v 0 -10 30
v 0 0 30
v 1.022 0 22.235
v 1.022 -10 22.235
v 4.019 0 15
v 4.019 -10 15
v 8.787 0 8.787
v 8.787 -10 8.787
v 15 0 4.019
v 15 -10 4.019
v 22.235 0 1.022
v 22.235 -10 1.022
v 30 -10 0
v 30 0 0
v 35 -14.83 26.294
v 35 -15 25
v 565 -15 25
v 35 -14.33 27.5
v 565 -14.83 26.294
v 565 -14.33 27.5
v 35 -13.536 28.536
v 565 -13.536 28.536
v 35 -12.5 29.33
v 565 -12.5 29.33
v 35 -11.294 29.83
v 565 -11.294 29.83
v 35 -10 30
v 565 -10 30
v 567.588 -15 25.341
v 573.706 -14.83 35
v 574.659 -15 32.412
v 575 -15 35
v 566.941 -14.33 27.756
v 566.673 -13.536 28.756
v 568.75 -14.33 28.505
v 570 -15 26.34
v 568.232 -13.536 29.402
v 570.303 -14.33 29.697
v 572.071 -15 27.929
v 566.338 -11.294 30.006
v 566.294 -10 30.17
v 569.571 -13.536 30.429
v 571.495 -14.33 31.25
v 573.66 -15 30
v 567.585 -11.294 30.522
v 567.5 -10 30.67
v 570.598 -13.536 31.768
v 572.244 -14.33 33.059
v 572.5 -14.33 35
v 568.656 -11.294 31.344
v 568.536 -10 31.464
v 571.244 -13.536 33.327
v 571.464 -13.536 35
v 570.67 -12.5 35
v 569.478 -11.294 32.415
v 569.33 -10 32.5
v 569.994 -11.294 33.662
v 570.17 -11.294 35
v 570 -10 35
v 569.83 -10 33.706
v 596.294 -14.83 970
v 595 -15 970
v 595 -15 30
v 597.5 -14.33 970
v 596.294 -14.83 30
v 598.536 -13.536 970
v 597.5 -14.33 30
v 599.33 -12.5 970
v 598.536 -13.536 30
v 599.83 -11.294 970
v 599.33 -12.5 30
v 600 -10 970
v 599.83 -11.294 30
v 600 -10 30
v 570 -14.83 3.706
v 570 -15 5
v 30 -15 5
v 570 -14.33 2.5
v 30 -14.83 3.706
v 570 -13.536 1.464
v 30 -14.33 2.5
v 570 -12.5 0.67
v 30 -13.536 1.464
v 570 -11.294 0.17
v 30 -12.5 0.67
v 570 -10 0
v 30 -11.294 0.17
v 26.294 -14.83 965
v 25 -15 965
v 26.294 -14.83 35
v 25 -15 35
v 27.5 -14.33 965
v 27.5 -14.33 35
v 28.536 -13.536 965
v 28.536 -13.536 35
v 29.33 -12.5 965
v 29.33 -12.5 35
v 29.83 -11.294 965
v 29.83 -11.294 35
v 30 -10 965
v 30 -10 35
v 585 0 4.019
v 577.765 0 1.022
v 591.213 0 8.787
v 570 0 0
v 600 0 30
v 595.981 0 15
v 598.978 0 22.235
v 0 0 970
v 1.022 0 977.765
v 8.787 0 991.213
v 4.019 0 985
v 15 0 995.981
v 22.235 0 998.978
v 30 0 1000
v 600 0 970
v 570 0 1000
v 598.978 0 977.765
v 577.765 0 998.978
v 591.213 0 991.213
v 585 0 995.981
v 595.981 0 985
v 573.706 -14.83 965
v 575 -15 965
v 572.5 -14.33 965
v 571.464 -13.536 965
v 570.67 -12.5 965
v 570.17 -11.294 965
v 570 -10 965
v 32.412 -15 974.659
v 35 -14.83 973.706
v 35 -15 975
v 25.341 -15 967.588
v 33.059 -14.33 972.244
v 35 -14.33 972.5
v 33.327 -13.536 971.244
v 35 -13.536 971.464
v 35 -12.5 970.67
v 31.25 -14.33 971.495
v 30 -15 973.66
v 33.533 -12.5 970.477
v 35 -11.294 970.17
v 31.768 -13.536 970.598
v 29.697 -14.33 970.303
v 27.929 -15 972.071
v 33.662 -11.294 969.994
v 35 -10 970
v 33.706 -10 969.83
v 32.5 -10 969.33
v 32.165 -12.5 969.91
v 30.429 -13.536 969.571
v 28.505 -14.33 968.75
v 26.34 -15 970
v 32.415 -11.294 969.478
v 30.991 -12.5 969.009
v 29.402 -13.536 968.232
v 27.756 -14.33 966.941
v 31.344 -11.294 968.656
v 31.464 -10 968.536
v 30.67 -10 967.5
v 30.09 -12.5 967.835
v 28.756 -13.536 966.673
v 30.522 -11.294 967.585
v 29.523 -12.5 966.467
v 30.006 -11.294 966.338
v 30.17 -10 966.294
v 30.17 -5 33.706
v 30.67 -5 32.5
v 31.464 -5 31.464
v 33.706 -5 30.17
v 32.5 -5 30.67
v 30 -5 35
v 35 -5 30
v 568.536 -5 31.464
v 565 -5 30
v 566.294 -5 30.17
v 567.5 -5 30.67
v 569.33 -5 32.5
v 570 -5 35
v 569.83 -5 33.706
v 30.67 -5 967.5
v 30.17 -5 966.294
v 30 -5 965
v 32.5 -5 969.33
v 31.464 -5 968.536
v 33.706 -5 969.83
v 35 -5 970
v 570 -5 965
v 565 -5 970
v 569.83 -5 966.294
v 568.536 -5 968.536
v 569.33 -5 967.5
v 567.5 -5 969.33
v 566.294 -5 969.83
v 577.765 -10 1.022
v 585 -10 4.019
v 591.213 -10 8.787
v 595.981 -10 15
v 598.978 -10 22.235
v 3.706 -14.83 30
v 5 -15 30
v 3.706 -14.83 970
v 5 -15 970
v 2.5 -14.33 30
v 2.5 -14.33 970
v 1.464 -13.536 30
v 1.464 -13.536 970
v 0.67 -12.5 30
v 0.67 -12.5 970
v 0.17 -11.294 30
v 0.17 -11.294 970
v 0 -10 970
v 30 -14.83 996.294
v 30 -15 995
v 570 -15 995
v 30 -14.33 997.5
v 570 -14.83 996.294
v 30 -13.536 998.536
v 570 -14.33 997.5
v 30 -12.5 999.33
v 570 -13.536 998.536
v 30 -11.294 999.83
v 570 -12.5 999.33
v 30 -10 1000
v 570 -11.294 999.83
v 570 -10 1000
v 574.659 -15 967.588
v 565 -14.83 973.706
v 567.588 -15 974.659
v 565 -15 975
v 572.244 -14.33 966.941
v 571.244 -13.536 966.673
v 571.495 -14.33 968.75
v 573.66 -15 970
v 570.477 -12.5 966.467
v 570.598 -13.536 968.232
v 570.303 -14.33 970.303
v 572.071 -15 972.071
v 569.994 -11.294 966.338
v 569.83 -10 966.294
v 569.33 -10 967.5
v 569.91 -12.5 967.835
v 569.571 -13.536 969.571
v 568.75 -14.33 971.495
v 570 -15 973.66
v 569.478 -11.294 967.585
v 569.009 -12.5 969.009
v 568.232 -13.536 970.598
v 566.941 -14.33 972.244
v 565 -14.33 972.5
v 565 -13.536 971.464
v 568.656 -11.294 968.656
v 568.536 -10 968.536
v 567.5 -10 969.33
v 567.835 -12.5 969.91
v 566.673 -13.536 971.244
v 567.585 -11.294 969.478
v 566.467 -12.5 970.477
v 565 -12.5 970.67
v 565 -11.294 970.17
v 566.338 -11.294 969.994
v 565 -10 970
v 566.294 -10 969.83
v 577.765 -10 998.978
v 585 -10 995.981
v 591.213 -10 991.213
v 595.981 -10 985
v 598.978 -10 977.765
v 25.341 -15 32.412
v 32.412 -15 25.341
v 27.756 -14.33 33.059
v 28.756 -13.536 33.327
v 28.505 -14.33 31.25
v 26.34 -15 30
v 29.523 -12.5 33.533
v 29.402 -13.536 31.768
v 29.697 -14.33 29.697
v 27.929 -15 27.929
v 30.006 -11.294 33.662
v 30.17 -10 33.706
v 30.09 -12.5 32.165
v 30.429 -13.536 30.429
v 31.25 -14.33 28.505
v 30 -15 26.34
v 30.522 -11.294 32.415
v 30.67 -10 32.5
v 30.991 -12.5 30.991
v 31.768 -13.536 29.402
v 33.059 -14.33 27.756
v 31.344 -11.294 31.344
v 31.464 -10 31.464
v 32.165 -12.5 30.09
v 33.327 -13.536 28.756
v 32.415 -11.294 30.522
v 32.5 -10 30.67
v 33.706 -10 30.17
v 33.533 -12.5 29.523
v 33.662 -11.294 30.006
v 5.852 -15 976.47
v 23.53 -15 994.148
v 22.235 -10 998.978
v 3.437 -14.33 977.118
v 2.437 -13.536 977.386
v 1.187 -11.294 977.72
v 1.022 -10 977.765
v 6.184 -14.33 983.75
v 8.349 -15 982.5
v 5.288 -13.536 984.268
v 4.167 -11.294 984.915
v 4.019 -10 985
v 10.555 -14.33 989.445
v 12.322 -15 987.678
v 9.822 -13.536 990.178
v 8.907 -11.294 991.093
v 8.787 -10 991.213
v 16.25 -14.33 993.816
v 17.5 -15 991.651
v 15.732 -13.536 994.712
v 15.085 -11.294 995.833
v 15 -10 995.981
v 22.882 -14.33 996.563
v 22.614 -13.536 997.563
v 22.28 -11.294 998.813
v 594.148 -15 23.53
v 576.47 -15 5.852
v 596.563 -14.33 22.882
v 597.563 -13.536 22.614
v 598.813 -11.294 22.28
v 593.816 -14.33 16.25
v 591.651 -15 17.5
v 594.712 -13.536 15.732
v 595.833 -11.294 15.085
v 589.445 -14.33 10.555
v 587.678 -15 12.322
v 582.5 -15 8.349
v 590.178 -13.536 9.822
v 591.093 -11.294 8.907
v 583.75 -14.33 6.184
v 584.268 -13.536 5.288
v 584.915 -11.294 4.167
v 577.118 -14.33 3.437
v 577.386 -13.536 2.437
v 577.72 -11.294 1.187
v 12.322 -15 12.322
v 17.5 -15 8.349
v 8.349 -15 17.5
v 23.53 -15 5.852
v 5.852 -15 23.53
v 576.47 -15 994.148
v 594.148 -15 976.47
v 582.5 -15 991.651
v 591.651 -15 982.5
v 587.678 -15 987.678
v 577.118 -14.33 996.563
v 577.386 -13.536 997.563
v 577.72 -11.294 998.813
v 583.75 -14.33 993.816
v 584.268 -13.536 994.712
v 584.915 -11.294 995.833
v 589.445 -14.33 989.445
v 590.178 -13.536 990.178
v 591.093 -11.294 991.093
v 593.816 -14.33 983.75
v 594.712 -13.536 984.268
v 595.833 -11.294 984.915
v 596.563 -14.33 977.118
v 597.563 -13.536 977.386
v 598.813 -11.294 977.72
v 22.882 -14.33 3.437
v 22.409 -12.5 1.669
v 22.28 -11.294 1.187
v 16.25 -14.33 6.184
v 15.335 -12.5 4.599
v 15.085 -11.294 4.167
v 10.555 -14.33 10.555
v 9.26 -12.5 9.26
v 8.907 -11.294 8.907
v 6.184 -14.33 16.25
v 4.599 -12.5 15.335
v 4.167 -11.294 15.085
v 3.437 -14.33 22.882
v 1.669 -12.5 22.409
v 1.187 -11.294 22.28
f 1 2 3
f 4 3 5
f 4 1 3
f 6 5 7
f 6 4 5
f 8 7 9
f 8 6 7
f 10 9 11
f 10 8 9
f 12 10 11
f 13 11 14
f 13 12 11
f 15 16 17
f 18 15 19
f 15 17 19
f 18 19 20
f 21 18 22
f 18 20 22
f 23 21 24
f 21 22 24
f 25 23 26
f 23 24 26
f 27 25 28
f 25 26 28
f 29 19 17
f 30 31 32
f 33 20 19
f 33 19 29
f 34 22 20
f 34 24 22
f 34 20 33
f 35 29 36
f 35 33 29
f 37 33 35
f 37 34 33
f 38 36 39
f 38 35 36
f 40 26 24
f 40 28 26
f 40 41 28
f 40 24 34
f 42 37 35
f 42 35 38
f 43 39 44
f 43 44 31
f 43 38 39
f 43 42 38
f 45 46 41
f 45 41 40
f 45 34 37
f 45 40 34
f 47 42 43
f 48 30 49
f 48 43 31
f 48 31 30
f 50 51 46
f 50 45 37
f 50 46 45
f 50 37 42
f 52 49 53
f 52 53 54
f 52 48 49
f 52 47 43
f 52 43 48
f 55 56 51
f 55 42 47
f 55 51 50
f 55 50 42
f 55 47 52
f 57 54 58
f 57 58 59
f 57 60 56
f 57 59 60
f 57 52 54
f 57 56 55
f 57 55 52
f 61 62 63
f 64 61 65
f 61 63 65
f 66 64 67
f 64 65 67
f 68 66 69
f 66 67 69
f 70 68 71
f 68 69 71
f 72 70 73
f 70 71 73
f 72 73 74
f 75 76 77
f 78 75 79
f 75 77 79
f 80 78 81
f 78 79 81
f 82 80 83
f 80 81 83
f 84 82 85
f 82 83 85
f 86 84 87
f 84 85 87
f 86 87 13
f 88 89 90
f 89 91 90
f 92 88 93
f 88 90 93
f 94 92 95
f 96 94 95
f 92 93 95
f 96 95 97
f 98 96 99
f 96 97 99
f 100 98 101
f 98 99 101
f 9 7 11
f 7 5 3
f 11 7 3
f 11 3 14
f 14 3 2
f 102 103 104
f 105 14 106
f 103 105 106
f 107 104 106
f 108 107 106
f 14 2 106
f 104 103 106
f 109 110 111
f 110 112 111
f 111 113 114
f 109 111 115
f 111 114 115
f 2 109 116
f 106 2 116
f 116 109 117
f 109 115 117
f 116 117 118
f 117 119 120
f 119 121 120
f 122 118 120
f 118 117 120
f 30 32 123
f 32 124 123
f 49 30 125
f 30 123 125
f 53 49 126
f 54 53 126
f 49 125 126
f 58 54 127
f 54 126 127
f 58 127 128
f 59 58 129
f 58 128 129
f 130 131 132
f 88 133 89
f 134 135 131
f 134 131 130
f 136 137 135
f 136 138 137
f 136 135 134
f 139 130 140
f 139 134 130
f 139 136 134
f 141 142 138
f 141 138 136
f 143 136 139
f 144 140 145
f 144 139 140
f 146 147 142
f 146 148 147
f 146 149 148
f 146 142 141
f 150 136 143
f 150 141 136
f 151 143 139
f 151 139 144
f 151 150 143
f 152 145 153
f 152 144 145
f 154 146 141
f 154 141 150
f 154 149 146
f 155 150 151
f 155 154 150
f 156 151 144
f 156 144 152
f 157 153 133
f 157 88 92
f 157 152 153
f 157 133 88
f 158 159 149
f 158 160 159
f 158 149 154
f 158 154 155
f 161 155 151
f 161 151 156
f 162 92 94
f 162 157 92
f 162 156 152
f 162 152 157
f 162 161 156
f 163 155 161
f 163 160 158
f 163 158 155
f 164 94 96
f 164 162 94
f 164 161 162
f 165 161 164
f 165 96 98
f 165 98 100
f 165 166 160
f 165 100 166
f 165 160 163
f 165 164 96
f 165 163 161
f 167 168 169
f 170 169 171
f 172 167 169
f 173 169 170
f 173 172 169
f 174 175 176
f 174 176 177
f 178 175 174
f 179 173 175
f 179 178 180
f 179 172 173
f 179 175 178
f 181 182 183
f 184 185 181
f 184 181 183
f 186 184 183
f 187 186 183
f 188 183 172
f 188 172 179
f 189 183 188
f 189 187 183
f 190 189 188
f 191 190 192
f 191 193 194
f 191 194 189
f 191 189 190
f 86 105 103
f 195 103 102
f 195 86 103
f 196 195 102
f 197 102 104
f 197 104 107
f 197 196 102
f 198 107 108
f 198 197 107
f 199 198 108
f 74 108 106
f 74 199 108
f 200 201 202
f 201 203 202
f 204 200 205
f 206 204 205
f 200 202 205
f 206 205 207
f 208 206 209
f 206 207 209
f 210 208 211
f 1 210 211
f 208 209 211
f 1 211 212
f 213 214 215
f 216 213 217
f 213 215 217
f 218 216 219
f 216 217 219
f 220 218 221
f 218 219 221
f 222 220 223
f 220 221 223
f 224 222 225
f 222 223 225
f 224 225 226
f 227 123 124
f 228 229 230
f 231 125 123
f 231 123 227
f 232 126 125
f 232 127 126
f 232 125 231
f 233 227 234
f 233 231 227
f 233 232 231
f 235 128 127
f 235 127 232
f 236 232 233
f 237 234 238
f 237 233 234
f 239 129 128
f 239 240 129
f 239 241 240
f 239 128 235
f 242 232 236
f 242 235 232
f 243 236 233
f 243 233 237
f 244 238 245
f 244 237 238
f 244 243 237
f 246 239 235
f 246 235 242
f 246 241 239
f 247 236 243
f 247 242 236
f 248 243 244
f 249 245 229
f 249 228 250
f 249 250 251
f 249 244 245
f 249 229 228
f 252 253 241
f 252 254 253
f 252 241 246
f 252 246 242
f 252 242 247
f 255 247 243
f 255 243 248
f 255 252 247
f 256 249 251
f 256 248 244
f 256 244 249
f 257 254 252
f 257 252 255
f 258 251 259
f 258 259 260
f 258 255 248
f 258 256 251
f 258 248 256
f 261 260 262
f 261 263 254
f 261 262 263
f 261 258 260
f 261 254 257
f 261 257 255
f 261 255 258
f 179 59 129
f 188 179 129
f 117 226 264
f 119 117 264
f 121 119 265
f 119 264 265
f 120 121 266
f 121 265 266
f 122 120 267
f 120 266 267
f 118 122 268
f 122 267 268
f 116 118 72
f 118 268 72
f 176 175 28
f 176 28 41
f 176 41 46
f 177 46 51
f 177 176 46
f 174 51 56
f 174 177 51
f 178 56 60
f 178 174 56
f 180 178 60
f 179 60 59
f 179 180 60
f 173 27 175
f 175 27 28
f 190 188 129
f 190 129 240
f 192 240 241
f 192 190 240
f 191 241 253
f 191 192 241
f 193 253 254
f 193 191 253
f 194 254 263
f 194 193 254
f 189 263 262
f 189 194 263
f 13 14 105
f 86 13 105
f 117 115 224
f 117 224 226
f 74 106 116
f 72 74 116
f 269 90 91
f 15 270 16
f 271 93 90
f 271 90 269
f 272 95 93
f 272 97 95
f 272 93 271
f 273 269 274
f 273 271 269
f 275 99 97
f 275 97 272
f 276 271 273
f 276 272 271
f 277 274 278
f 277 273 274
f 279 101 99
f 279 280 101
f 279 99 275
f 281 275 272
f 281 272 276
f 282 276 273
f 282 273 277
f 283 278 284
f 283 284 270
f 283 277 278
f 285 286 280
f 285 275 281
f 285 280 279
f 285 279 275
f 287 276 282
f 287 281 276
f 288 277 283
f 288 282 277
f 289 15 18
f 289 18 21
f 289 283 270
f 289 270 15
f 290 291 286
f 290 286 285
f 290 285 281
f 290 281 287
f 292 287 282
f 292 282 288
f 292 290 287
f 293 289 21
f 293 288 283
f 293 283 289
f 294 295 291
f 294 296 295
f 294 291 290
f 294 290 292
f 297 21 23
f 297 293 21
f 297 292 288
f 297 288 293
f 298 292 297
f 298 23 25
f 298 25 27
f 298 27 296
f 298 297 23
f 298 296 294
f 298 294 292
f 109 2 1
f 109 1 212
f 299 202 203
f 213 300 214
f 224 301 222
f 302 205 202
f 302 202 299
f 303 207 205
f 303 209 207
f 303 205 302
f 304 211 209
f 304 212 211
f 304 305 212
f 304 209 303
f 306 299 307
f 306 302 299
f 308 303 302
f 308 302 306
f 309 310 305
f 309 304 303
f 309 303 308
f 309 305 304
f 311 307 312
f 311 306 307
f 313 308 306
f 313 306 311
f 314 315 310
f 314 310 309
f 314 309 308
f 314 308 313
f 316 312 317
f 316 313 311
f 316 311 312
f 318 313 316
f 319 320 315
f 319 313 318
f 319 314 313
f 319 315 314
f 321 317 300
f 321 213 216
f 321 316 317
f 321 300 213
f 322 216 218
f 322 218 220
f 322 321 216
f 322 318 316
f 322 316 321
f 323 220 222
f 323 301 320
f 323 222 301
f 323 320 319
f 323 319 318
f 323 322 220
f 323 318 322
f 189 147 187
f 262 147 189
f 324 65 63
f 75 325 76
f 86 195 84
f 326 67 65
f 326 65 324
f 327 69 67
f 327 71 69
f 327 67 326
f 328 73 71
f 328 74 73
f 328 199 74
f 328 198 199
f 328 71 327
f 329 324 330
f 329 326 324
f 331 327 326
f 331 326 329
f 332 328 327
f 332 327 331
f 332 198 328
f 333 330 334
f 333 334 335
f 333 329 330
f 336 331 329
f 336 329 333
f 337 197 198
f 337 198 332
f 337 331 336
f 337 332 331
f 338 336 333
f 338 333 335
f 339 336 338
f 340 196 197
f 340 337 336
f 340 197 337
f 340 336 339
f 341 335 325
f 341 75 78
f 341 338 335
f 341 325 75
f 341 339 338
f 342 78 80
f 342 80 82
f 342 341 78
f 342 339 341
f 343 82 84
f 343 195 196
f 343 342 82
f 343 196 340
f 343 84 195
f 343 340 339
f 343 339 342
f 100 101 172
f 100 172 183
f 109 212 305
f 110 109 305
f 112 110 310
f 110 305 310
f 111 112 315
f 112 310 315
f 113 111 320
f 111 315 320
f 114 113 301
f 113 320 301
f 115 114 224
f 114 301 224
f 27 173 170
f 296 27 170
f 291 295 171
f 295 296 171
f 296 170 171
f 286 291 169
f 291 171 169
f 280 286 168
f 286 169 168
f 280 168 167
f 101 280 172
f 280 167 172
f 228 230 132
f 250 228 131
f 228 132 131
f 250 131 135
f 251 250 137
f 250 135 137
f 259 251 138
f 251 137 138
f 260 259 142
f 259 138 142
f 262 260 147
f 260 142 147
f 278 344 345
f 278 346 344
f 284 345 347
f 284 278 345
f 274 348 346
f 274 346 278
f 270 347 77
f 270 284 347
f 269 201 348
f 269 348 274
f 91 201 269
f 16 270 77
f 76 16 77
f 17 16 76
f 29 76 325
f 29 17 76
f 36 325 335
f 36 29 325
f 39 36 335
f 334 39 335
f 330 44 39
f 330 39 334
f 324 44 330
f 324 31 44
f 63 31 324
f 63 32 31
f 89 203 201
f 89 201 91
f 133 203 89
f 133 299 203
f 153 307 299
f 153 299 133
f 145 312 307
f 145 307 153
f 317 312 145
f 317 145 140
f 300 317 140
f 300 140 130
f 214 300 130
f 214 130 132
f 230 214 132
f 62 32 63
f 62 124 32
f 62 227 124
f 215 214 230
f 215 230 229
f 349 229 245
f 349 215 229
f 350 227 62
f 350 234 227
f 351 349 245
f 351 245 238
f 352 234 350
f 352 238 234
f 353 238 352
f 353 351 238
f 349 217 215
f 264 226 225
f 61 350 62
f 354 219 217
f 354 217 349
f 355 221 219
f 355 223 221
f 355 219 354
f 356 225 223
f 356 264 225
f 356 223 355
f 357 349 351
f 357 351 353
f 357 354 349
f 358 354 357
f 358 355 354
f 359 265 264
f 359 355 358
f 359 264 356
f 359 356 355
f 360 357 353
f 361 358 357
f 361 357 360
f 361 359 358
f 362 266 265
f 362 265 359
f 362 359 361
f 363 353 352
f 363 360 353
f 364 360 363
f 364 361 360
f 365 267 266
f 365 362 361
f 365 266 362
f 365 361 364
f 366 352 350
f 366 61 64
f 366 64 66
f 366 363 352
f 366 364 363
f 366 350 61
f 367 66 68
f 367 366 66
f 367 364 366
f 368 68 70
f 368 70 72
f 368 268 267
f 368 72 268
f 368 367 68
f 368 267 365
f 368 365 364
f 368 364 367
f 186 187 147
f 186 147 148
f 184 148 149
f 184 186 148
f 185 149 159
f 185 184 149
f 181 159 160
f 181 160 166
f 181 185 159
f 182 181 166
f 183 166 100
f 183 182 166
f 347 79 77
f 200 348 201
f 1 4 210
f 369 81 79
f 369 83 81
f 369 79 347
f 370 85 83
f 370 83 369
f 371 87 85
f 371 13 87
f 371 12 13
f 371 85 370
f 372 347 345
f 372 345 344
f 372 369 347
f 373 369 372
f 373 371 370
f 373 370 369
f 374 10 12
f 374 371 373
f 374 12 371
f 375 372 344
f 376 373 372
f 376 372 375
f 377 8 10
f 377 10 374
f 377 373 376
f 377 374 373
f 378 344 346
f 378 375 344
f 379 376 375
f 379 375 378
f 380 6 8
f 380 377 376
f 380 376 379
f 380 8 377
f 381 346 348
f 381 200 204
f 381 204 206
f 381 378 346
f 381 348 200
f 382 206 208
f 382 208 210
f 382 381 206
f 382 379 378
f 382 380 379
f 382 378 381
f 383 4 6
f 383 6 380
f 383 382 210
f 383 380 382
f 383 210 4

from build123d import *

# Parameters (mm, degrees)
F0_W     = 600
F0_H     = 1000
F1_DEPTH = 15
F2_W     = 540
F2_H     = 940
F3_DEPTH = 10
F4_R     = 30
F5_R     = 5
F6_R     = 5


with BuildPart() as f1:
    # F0 (on Front) → F1 (new body)
    with BuildSketch(Plane.XZ):
        with Locations((300, 500)):
            Rectangle(F0_W, F0_H)
    extrude(amount=F1_DEPTH)

    # F2 (on face) → F3 (cut)
    with BuildSketch(Plane.XZ.offset(15)):
        with Locations((300, 500)):
            Rectangle(F2_W, F2_H)
    extrude(amount=-F3_DEPTH, mode=Mode.SUBTRACT)

    # F4
    f4_edges = [f1.edges().sort_by_distance(p)[0] for p in [
        (0, -7.5, 1000),
        (600, -7.5, 1000),
        (600, -7.5, 0),
        (0, -7.5, 0),
    ]]
    fillet(f4_edges, radius=F4_R)

    # F5
    f5_edges = [f1.edges().sort_by_distance(p)[0] for p in [
        (30, -10, 30),
        (570, -10, 30),
        (570, -10, 970),
        (30, -10, 970),
    ]]
    fillet(f5_edges, radius=F5_R)

    # F6
    f6_edges = [f1.edges().sort_by_distance(p)[0] for p in [
        (570, -15, 500),
        (568.535534, -15, 31.464466),
        (568.535534, -15, 968.535534),
        (300, -15, 30),
        (300, -15, 970),
        (31.464466, -15, 31.464466),
        (31.464466, -15, 968.535534),
        (30, -15, 500),
        (0, -15, 500),
        (8.786797, -15, 991.213203),
        (8.786797, -15, 8.786797),
        (300, -15, 1000),
        (300, -15, 0),
        (591.213203, -15, 991.213203),
        (591.213203, -15, 8.786797),
        (600, -15, 500),
    ]]
    fillet(f6_edges, radius=F6_R)


solid = f1.part
